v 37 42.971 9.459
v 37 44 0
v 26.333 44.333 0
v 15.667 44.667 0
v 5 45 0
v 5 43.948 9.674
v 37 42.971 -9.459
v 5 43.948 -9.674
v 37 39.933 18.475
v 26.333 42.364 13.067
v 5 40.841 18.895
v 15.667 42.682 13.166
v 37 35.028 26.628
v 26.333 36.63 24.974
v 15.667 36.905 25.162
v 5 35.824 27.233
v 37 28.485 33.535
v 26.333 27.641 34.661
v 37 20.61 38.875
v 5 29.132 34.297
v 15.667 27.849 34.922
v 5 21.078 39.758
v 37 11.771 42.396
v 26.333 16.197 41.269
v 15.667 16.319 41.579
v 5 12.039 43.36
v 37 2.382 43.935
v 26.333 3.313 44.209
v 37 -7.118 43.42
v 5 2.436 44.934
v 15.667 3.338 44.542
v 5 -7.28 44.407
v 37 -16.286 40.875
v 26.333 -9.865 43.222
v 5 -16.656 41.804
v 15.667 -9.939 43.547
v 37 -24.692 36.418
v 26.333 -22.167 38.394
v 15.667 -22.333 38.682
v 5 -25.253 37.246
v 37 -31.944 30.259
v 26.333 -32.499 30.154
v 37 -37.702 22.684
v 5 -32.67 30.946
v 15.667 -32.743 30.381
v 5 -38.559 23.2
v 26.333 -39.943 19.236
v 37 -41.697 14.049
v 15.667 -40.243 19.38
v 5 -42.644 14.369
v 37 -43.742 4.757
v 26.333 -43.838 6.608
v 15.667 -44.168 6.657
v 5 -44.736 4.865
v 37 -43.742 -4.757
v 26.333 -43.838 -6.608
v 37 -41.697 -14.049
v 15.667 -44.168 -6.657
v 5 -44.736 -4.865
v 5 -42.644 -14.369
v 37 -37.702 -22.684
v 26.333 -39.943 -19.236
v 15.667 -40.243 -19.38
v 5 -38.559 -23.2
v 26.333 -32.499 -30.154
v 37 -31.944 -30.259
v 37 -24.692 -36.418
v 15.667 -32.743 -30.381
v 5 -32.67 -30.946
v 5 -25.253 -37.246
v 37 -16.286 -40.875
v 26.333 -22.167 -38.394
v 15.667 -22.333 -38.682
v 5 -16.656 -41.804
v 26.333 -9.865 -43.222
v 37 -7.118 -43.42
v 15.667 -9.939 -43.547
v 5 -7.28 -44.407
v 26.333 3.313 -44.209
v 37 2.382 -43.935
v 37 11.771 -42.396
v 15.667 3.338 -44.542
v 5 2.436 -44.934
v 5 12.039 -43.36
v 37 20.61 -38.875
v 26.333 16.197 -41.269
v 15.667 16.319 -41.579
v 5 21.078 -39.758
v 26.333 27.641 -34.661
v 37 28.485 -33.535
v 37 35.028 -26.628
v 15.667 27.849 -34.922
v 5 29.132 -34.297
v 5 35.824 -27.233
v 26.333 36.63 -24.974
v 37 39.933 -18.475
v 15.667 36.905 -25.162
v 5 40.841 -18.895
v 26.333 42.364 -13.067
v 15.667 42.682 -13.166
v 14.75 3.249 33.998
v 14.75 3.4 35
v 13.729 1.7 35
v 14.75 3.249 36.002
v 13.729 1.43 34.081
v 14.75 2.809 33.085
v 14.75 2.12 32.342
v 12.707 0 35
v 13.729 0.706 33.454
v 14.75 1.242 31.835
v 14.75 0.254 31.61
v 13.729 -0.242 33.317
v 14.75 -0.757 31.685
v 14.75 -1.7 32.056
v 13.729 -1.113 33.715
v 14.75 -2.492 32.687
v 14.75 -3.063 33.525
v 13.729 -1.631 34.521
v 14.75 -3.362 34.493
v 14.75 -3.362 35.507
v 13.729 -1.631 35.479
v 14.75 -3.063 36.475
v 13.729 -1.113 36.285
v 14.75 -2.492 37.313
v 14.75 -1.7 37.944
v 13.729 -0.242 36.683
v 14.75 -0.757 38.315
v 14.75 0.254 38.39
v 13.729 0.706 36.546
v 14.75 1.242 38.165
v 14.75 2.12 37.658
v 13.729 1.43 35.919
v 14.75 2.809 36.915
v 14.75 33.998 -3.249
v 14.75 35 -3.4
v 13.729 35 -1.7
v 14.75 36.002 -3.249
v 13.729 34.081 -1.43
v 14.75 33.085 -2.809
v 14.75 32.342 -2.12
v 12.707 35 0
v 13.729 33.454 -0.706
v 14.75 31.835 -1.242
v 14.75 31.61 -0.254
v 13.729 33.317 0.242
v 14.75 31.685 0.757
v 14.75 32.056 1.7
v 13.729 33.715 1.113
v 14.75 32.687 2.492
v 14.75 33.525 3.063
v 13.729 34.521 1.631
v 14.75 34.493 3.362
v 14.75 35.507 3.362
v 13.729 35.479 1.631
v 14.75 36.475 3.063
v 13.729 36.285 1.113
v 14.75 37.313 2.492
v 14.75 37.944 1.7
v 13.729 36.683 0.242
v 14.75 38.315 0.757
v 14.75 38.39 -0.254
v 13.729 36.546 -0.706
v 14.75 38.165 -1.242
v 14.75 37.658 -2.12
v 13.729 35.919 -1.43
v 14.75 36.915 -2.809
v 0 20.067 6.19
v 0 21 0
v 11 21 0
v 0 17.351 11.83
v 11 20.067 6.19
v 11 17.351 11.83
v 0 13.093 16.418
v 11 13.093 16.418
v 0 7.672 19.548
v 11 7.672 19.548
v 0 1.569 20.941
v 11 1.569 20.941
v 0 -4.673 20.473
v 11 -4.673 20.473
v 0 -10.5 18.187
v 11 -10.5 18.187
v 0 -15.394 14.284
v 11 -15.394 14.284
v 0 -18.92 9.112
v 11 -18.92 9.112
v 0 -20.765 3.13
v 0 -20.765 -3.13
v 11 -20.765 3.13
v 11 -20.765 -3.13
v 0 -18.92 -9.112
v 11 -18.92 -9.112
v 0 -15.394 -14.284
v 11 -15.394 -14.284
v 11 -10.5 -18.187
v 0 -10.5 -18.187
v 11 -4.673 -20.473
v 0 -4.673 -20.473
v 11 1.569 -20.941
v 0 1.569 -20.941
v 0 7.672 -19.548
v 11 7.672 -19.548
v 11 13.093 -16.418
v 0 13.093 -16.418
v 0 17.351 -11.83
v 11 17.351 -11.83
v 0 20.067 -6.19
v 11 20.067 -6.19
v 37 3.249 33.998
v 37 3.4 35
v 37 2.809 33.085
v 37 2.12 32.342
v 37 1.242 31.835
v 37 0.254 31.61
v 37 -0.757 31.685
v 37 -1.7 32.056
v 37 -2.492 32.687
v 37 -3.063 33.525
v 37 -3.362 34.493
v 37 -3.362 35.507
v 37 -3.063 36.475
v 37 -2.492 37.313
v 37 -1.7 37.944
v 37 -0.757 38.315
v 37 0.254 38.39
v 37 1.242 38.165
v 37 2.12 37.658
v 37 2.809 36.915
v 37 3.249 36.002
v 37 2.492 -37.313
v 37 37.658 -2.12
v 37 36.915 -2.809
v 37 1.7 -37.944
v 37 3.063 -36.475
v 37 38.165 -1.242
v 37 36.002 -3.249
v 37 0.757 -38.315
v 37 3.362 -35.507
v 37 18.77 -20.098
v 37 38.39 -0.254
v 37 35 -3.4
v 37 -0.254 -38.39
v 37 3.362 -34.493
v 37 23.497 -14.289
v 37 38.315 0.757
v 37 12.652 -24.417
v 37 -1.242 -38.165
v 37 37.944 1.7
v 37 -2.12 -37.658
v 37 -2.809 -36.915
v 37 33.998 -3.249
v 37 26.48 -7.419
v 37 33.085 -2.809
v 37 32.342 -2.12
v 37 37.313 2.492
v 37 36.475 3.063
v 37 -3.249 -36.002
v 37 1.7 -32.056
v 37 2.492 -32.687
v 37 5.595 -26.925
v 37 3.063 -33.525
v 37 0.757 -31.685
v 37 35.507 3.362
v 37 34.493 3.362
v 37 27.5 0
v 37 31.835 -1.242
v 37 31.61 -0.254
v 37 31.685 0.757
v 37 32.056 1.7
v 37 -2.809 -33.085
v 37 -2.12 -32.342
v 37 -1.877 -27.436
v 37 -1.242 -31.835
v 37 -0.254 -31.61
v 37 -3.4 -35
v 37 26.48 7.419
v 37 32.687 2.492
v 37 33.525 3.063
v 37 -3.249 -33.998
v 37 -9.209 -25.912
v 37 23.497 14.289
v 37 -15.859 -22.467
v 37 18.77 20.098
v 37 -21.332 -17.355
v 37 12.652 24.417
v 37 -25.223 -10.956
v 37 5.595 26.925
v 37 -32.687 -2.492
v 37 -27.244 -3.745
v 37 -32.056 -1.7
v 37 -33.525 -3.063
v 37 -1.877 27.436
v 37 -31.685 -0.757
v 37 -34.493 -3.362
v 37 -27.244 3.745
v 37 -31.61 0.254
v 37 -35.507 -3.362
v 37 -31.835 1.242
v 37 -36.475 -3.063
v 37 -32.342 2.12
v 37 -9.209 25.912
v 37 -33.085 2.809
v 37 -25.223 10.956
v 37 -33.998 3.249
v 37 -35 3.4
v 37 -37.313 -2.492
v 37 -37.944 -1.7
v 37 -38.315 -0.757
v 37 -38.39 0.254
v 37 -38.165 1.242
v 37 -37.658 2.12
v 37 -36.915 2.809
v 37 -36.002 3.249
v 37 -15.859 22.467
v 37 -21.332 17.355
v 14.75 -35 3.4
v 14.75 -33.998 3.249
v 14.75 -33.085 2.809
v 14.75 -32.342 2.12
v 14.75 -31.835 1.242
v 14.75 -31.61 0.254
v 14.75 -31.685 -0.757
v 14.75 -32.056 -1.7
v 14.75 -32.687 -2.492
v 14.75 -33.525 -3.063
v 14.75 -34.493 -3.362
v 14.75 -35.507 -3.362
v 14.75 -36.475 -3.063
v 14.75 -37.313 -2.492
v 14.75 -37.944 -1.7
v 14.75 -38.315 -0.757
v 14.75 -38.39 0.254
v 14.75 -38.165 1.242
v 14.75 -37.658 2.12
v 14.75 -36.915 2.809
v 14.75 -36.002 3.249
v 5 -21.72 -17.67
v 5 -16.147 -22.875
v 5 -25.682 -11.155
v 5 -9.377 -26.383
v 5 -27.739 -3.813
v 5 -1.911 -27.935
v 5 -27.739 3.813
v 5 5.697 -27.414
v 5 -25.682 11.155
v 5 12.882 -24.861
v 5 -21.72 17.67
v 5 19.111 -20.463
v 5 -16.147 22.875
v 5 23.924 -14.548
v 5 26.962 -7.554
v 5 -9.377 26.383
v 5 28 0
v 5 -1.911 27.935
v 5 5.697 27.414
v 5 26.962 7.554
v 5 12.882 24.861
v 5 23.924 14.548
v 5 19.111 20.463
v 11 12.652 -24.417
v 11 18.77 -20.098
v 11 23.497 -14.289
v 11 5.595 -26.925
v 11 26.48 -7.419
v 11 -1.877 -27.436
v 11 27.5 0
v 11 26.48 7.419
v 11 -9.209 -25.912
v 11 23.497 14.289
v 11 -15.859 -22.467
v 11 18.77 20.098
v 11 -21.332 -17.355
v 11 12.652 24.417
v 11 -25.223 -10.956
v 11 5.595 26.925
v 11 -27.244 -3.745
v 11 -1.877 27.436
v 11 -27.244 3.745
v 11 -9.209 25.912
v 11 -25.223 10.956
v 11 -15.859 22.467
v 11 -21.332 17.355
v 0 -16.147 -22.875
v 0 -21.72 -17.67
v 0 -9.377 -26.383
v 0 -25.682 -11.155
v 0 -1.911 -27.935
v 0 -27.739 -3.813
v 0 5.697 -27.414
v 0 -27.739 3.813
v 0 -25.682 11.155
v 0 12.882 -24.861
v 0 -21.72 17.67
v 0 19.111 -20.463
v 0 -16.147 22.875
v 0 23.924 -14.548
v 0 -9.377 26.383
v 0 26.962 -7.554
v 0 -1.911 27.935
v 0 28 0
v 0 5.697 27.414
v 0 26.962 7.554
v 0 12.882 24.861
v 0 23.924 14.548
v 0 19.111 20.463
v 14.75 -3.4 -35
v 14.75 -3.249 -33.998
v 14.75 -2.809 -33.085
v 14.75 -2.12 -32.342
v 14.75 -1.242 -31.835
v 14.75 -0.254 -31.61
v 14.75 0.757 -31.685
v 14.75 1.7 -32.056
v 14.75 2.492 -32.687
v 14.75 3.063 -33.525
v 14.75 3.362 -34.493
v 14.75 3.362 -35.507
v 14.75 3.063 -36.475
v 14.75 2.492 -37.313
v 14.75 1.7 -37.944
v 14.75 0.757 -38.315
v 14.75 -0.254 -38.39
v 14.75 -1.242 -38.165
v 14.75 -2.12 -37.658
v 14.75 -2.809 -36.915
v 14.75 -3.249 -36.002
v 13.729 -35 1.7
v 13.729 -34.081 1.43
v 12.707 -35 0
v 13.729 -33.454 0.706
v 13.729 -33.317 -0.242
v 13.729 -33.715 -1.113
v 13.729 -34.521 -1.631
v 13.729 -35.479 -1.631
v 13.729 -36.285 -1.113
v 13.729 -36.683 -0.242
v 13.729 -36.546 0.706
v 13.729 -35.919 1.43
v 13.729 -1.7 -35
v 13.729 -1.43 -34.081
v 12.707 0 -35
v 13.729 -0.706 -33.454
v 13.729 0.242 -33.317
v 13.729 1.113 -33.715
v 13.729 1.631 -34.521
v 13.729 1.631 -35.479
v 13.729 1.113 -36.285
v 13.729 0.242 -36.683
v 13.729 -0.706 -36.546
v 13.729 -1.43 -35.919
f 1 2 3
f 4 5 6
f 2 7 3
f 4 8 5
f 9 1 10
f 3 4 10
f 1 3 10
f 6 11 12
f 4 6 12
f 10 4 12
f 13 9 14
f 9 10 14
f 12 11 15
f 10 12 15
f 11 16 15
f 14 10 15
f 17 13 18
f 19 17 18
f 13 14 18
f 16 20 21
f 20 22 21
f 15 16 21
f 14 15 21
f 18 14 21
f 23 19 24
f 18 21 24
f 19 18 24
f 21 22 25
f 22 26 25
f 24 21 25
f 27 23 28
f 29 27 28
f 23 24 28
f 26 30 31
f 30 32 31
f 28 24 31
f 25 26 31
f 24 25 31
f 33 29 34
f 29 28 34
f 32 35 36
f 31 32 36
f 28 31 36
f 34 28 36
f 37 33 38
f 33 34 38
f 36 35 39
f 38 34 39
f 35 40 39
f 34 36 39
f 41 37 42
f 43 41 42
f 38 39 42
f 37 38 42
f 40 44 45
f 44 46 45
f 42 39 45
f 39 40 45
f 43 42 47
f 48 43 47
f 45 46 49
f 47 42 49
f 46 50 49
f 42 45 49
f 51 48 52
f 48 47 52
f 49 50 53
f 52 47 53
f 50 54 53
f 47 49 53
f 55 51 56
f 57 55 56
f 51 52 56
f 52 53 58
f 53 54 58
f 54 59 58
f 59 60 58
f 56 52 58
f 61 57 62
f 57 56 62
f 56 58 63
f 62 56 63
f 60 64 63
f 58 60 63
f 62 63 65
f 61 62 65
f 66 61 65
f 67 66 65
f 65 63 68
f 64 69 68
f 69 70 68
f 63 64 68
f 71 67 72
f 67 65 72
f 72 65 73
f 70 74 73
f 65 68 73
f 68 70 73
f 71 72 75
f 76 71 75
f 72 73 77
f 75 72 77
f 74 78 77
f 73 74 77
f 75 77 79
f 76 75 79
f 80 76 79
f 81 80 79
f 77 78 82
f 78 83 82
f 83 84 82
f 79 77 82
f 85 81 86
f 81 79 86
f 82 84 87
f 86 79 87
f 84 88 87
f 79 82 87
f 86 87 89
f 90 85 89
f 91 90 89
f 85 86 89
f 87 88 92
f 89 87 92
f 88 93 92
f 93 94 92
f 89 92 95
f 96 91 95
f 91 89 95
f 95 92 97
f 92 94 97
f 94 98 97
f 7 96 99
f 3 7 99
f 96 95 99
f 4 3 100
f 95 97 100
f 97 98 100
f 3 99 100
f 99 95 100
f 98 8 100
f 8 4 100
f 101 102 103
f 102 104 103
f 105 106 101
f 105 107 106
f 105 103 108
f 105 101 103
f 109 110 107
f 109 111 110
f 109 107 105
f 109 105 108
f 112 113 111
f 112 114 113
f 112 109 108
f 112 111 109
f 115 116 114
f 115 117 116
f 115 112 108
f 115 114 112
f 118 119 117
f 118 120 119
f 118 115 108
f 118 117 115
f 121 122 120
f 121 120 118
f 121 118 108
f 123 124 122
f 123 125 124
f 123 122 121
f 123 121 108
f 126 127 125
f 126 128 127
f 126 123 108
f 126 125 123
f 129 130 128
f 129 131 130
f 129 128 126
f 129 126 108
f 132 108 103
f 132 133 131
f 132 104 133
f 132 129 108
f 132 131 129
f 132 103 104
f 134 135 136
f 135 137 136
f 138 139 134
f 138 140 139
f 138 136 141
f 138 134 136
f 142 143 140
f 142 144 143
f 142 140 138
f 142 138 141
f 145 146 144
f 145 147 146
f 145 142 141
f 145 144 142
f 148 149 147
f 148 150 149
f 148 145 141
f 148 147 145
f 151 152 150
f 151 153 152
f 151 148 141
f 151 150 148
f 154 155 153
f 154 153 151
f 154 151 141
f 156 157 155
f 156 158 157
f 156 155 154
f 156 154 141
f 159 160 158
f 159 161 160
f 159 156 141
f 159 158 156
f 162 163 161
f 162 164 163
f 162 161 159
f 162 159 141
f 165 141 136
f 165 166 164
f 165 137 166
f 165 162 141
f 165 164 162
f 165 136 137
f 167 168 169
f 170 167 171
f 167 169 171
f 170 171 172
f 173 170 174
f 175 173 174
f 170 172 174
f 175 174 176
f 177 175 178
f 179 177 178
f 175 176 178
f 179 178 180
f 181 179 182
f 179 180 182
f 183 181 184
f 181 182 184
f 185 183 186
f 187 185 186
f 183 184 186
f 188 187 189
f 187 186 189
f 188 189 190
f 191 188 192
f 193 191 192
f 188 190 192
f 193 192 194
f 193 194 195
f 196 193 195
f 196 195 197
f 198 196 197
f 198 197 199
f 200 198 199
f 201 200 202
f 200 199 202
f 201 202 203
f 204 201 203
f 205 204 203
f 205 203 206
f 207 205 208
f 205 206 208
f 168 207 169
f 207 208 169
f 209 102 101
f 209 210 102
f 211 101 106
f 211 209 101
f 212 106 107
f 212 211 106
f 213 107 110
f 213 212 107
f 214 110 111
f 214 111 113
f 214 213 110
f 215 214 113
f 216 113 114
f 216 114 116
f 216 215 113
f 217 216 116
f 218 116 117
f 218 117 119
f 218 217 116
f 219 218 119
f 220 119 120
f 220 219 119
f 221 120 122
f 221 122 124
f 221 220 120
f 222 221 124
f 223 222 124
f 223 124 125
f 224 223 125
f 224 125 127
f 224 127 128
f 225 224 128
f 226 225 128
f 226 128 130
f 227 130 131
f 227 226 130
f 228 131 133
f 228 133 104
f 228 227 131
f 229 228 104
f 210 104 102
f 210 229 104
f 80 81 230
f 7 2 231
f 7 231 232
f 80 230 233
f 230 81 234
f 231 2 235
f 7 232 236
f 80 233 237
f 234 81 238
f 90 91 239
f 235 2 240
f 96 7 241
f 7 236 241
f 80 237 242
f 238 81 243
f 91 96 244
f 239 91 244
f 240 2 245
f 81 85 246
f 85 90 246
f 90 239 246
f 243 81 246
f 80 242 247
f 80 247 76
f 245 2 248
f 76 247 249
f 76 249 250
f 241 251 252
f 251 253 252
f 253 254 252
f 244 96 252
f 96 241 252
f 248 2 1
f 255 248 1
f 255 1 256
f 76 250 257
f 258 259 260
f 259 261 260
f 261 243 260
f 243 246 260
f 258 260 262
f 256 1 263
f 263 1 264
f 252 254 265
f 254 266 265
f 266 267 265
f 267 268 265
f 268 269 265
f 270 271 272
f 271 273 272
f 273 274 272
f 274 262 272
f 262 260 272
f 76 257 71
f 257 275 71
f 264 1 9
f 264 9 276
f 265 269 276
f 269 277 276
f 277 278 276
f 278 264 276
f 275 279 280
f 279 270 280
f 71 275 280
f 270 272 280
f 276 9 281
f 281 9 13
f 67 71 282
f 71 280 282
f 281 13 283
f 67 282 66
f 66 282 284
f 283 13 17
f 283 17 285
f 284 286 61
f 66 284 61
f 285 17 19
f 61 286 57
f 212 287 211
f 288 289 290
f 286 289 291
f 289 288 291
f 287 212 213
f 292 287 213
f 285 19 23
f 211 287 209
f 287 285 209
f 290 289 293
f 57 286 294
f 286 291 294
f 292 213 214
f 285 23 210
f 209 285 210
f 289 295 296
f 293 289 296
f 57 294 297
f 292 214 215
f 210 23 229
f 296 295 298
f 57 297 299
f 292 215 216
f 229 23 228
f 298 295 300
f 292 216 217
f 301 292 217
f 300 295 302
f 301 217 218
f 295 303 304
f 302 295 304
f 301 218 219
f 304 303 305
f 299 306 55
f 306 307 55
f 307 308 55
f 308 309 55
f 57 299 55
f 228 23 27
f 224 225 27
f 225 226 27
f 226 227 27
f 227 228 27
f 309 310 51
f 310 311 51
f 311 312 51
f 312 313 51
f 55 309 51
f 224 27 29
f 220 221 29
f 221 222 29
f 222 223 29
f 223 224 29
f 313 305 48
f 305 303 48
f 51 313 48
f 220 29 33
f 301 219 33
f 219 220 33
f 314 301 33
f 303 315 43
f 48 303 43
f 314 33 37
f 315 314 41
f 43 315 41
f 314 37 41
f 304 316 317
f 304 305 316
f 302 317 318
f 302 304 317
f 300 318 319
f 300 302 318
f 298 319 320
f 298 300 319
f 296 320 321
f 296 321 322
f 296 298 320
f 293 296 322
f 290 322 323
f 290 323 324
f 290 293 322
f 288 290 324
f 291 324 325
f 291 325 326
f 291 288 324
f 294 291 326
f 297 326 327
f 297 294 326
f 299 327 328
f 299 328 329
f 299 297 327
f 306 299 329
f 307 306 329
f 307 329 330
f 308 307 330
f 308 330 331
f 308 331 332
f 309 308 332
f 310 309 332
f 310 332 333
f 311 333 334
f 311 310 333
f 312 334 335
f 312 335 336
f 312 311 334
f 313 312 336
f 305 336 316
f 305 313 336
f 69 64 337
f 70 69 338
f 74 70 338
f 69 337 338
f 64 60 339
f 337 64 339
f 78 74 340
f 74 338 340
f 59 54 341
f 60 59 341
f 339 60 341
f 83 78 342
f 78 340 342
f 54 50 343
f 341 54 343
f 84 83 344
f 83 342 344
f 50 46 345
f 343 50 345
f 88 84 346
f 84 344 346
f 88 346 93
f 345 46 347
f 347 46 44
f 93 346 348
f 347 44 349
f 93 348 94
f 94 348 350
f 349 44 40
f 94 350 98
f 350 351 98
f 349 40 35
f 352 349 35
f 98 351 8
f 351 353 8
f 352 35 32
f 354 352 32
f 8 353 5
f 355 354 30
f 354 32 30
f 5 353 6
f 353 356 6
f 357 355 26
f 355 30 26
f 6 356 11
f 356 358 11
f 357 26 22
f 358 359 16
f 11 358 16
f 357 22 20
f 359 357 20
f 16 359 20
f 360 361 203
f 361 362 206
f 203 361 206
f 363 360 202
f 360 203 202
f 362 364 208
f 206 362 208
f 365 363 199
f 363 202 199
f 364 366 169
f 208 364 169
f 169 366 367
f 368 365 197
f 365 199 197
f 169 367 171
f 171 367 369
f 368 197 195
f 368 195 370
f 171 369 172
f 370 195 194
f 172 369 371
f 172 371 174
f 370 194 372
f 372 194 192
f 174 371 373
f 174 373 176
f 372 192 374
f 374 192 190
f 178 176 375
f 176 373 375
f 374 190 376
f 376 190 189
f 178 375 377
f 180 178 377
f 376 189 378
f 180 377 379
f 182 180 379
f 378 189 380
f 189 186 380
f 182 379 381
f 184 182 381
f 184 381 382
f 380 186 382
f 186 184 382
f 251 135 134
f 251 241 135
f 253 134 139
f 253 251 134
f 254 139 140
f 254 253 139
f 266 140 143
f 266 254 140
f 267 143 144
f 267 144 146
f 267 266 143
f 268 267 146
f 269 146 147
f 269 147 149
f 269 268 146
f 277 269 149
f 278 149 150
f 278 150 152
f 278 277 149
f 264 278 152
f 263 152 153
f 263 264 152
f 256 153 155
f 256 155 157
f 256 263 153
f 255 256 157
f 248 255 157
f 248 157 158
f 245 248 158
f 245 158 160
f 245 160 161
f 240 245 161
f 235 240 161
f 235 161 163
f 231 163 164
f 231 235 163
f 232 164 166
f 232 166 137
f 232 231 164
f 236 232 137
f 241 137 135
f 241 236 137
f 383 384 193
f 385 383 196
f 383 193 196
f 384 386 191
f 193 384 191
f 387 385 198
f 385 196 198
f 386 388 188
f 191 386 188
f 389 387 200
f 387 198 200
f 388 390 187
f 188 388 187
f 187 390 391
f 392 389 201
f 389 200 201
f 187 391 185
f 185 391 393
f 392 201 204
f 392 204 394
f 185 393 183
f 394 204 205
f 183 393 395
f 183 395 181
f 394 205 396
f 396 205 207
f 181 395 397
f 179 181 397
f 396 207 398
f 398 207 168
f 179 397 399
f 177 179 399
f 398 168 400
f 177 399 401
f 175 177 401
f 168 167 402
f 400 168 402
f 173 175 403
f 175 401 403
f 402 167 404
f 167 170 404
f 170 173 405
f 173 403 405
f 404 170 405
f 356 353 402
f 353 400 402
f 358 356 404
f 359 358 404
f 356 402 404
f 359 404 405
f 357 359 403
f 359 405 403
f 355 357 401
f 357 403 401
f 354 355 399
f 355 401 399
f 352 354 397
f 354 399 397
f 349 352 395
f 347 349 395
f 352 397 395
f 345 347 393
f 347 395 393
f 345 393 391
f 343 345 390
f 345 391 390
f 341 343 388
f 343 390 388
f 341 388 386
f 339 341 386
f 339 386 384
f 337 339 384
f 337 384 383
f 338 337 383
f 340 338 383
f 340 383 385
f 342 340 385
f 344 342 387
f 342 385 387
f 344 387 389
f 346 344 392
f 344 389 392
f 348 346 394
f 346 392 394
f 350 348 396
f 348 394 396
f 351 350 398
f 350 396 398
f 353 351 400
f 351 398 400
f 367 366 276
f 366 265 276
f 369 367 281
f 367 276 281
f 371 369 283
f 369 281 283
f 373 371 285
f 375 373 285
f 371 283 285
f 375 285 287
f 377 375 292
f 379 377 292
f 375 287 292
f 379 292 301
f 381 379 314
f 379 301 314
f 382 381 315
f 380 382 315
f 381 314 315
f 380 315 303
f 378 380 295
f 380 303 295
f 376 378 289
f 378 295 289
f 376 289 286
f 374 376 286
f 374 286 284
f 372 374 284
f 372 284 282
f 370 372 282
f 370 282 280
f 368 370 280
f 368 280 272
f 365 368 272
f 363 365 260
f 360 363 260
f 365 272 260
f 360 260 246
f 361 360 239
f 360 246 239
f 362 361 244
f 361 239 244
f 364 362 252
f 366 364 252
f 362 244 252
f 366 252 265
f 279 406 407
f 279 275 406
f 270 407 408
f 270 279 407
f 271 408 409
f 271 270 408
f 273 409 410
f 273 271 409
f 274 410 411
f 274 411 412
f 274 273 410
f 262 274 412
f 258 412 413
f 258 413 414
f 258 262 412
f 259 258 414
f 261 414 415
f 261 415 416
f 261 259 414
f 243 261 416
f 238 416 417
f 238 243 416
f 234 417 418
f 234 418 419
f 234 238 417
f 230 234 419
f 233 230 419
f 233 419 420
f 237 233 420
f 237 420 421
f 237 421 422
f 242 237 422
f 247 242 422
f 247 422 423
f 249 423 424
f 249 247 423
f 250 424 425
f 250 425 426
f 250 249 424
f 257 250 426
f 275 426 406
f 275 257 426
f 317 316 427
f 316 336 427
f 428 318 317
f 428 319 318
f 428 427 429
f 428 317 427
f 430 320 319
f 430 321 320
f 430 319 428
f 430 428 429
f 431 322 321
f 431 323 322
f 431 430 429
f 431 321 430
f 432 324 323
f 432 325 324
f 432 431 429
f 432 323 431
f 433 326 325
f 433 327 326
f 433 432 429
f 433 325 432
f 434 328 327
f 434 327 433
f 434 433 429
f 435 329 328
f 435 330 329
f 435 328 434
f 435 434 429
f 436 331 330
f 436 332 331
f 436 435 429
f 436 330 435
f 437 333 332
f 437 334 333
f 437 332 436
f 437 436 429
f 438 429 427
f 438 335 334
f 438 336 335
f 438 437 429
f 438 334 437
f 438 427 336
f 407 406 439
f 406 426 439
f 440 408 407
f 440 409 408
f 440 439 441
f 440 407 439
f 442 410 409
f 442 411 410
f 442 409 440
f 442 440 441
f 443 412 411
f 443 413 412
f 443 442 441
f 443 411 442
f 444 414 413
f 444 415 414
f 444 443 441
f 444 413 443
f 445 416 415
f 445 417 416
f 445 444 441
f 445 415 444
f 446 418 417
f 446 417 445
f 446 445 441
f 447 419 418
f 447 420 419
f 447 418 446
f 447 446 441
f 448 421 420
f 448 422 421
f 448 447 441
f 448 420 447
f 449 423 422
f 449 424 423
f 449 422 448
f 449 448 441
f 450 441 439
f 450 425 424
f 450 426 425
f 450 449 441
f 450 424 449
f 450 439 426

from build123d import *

# Parameters (mm, degrees)
DAIRESEL_KAPLAMA2_COUNT = 4


with BuildPart() as part:
    # Çizim1 → Döndür1 (revolve)
    with BuildSketch(Plane.XY):
        Polygon((0, 21), (11, 21), (11, 27.5), (37, 27.5), (37, 44), (5, 45), (5, 28), (0, 28), align=None)
    revolve(axis=Axis((0, 0, 0), (1, 0, 0)))

    # Çizim4 → M8 Dişli Delik1 (revolve, cut)
    with BuildSketch(Plane(origin=(37, 35, 0), x_dir=(0, 0, -1), z_dir=(0, 1, 0))):
        Polygon((0, 0), (0, 24.292926105), (3.4, 22.25), (3.4, 0), align=None)
    m8_di_li_delik1 = revolve(axis=Axis((43.35, 35, 0), (-1, 0, 0)), mode=Mode.SUBTRACT)

    # Dairesel Kaplama2: M8 Dişli Delik1 ×4 about axis
    dairesel_kaplama2_axis = Axis((0, 0, 0), (1, 0, 0))
    for i in range(1, DAIRESEL_KAPLAMA2_COUNT):
        add(m8_di_li_delik1.rotate(dairesel_kaplama2_axis, i * 360 / DAIRESEL_KAPLAMA2_COUNT), mode=Mode.SUBTRACT)


solid = part.part
